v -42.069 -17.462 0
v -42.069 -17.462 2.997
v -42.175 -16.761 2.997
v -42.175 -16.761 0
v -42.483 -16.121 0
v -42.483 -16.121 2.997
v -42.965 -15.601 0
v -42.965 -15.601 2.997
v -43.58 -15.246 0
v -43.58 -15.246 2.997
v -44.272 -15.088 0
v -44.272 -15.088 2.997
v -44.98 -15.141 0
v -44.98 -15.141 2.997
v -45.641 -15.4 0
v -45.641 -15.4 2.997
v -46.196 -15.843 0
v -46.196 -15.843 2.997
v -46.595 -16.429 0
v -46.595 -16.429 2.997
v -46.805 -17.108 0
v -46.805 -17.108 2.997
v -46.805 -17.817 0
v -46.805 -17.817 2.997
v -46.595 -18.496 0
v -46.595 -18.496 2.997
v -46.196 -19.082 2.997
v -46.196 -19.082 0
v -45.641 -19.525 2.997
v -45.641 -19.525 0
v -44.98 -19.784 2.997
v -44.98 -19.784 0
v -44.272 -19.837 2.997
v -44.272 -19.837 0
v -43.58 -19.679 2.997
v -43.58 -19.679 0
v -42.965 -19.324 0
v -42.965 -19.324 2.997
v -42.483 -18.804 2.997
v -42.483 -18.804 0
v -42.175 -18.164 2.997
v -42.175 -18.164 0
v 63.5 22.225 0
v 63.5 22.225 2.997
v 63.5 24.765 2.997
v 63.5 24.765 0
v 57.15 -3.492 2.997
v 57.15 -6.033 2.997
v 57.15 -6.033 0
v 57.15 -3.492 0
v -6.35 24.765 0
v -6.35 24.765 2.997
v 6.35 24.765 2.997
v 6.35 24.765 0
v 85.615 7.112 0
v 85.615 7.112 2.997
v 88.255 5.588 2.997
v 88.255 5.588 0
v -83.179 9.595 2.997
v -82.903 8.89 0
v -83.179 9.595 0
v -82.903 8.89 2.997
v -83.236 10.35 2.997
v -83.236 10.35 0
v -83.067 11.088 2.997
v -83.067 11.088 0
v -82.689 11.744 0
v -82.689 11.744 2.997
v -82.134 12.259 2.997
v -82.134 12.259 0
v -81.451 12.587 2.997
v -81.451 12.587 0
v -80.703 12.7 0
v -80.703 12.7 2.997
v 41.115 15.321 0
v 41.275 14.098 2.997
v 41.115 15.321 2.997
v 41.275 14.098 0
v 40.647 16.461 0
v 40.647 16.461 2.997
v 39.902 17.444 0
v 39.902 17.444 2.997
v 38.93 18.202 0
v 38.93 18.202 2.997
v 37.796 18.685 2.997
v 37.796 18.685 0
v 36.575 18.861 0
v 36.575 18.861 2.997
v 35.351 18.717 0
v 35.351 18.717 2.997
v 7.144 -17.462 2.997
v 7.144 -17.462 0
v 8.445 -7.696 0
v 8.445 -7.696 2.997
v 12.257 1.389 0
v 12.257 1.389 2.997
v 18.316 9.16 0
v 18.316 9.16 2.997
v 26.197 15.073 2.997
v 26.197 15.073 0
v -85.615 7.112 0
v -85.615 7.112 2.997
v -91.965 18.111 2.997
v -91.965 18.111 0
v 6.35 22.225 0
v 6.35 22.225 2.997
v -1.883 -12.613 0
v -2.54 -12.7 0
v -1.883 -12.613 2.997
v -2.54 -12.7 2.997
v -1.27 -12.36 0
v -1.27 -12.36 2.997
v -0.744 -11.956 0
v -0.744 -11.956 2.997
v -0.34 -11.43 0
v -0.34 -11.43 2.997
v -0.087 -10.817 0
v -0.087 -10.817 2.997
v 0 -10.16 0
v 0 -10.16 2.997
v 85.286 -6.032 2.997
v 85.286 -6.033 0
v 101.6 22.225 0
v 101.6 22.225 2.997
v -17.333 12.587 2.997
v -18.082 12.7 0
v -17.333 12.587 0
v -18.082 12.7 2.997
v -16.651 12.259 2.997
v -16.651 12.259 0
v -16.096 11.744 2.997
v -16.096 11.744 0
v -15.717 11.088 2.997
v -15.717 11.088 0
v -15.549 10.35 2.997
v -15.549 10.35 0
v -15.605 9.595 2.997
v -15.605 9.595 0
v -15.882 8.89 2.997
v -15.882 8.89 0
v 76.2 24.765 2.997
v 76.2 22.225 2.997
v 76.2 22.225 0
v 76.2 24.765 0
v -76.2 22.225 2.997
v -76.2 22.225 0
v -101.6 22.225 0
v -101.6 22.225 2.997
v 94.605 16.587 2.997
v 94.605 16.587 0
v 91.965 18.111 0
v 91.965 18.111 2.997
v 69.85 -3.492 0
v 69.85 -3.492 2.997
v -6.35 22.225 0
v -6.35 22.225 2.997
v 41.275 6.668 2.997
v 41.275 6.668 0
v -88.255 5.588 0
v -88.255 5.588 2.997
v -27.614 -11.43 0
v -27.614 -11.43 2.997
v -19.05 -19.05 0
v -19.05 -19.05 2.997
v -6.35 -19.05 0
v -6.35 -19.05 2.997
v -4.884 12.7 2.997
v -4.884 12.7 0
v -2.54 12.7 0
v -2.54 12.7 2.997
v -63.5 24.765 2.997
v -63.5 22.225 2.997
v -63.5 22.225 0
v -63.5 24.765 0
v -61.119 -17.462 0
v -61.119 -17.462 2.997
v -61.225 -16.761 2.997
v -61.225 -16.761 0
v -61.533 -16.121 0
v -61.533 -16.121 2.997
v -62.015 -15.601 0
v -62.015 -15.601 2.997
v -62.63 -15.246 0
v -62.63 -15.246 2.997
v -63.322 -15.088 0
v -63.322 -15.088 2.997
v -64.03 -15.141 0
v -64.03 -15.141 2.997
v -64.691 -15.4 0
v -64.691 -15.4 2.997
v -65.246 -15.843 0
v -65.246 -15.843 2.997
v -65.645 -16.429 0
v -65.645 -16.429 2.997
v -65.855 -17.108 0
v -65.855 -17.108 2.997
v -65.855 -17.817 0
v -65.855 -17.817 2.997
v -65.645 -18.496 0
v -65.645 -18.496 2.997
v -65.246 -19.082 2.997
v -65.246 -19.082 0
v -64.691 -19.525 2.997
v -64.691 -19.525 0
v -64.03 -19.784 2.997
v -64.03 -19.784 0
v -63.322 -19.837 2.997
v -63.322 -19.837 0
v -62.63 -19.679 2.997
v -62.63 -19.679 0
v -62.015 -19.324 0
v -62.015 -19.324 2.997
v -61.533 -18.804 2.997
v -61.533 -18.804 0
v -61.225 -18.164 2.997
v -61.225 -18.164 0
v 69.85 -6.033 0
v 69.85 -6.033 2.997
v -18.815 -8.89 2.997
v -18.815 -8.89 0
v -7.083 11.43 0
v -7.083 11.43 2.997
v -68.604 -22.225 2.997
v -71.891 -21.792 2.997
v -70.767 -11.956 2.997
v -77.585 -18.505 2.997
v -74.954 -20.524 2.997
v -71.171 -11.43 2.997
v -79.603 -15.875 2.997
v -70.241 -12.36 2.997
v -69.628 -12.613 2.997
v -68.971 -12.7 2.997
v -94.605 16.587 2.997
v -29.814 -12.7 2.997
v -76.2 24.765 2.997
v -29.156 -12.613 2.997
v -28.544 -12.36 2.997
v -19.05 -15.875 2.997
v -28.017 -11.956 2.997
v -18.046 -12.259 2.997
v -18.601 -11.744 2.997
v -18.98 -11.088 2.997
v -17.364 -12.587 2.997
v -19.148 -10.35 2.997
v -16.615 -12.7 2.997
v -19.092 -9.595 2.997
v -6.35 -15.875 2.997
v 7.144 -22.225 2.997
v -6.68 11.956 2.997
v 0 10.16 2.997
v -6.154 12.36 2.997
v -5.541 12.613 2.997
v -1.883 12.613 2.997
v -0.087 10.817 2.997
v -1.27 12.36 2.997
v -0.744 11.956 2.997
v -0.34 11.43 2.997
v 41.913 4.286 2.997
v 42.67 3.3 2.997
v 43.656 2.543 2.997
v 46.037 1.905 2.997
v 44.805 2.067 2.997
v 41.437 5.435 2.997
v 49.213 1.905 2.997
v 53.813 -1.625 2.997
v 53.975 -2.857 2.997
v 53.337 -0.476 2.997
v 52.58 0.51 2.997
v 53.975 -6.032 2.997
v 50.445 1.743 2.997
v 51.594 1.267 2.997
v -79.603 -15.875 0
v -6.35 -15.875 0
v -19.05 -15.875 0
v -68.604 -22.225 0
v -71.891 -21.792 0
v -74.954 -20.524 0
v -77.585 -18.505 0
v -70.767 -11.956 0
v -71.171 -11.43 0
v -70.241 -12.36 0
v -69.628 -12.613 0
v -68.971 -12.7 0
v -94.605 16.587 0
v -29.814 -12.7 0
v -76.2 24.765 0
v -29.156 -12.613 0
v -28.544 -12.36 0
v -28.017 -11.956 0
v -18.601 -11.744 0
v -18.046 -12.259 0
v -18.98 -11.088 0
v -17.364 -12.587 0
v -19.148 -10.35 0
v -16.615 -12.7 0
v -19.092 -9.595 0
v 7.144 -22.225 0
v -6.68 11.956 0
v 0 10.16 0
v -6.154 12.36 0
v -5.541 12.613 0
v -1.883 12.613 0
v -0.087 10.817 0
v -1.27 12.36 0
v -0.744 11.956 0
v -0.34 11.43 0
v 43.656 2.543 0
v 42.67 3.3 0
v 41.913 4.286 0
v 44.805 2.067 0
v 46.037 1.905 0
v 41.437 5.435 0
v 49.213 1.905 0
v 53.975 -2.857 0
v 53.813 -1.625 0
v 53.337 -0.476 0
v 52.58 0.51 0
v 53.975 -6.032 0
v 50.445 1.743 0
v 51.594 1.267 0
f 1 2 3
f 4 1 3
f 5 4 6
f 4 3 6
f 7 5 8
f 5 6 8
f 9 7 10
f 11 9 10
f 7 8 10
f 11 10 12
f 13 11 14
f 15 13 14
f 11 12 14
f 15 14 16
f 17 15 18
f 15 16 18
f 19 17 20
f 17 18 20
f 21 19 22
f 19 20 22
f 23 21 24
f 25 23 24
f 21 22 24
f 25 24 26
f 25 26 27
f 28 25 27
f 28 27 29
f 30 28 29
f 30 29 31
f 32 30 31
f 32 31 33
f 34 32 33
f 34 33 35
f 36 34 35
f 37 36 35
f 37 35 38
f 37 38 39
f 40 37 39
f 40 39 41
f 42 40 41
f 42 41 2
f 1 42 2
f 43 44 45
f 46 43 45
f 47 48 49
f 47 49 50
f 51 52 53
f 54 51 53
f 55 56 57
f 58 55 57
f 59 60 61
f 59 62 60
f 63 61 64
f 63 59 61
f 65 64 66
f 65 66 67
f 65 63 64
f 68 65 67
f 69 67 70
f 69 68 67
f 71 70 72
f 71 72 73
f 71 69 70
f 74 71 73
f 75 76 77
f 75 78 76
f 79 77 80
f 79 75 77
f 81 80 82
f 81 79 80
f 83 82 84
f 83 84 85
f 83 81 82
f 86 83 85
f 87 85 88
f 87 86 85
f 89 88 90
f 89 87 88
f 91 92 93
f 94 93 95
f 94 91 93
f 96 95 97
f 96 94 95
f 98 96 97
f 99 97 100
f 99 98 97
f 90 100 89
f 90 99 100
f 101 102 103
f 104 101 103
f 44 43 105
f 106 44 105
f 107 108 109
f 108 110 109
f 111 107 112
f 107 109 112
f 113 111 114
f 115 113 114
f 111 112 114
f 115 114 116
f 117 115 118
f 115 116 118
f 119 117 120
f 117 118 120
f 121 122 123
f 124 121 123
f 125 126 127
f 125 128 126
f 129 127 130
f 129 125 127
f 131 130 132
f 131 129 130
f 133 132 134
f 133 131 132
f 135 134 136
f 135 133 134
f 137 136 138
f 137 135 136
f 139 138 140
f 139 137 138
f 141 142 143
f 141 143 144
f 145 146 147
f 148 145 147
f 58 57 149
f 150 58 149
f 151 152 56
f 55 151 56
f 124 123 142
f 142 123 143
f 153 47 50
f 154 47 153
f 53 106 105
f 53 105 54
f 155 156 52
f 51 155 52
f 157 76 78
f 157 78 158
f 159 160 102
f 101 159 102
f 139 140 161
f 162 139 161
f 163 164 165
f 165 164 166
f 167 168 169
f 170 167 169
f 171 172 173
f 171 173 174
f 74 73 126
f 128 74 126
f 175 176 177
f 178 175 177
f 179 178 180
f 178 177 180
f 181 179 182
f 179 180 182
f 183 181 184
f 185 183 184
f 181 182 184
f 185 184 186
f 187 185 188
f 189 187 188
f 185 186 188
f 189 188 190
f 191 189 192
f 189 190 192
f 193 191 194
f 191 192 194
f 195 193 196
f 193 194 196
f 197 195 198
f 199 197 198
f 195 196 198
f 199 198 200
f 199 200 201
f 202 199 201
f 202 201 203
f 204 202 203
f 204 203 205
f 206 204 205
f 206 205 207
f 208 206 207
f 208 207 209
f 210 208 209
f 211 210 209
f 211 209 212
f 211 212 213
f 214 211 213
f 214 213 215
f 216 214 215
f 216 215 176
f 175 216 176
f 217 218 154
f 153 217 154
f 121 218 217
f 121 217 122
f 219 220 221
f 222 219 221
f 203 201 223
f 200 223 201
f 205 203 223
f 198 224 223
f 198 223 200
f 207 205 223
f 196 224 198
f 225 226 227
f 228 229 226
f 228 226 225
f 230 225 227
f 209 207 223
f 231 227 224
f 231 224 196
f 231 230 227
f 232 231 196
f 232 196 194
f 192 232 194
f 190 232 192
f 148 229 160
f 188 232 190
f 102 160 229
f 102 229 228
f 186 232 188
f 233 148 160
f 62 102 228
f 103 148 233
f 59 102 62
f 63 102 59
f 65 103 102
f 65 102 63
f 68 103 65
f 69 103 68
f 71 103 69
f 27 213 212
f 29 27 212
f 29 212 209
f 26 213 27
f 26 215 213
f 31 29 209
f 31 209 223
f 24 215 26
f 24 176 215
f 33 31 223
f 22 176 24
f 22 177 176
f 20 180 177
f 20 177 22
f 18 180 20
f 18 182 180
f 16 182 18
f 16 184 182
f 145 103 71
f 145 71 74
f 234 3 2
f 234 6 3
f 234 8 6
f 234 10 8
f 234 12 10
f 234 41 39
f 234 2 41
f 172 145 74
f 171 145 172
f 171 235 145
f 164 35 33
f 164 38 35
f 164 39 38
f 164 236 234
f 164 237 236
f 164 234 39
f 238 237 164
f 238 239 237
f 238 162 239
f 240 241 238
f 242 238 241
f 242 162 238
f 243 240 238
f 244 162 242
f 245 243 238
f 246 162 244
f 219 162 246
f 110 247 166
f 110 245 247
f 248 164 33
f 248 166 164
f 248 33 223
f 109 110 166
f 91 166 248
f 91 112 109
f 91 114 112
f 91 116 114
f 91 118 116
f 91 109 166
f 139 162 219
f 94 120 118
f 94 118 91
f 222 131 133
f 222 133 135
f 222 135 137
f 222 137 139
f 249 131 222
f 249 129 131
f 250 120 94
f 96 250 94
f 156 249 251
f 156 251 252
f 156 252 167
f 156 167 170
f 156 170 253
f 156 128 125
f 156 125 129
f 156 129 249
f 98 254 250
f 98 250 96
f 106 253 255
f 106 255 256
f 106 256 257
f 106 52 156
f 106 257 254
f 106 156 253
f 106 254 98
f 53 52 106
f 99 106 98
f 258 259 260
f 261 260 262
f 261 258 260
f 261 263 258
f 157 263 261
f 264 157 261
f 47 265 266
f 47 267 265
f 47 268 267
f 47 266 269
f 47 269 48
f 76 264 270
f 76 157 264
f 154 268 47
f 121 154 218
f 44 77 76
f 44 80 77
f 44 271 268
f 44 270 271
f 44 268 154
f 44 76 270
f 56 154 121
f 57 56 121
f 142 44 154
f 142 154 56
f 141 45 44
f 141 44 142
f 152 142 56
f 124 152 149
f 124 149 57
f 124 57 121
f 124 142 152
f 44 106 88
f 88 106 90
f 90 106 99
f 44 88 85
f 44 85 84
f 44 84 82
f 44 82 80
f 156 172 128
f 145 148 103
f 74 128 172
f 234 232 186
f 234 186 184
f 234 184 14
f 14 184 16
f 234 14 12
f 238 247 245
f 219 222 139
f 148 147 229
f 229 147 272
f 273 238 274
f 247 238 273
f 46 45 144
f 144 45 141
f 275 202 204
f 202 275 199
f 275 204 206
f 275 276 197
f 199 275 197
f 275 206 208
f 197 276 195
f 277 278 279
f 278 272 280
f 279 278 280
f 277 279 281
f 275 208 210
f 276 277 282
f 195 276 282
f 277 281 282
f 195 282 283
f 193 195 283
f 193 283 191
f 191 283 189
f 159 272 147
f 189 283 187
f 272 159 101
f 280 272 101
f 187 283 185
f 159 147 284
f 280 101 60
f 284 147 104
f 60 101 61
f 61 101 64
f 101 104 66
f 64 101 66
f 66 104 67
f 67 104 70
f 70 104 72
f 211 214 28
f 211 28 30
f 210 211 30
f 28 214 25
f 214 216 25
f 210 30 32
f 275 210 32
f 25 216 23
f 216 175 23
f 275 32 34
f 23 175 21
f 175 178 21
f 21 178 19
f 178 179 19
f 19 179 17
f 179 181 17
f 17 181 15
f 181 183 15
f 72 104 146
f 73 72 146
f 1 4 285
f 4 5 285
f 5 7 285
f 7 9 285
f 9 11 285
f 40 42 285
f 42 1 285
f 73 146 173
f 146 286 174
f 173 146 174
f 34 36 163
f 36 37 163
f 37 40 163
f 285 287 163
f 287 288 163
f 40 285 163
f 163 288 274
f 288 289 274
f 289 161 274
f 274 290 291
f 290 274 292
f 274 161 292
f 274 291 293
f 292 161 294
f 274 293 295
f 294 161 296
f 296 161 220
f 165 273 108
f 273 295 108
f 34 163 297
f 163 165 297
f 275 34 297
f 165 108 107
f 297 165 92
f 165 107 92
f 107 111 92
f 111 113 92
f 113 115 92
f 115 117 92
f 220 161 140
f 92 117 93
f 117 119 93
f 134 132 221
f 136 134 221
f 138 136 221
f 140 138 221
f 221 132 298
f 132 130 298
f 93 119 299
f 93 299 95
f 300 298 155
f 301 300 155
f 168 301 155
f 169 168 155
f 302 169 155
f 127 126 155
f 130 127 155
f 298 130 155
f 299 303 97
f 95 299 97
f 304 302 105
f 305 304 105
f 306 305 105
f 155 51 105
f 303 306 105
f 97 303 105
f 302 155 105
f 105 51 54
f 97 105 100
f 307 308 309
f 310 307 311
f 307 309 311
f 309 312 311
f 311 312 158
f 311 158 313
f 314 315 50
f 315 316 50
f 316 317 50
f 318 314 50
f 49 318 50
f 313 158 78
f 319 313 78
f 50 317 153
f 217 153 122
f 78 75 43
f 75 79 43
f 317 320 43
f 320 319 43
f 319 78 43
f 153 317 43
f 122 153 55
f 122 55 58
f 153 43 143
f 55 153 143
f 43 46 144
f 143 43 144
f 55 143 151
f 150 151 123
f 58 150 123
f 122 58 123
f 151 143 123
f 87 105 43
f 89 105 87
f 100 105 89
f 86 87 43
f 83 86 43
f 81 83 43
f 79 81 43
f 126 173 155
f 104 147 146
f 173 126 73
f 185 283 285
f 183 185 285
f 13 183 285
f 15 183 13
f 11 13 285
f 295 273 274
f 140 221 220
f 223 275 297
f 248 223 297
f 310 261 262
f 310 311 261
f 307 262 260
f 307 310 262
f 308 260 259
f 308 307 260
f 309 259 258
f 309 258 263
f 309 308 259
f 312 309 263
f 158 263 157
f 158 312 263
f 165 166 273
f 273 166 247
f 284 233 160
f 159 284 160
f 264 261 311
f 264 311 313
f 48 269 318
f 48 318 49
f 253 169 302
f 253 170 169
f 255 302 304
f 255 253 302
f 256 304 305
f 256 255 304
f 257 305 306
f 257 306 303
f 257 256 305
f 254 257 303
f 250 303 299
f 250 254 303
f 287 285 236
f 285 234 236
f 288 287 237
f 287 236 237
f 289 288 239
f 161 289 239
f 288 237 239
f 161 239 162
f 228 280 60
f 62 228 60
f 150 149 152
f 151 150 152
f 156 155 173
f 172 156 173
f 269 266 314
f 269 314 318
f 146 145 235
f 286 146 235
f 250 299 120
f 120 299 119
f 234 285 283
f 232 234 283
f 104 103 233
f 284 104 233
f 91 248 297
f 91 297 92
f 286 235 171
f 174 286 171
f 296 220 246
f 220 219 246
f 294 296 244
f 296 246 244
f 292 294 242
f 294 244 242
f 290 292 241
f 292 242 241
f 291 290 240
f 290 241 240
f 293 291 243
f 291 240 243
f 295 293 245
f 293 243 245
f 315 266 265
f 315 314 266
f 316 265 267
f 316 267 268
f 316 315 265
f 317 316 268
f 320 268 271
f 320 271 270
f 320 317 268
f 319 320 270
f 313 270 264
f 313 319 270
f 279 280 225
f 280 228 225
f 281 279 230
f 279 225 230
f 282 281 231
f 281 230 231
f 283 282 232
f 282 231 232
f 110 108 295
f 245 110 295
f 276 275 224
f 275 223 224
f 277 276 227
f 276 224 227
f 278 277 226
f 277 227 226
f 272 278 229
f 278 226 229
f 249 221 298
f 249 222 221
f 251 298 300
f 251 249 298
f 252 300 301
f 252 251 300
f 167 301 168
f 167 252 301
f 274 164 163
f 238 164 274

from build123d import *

# Parameters (mm, degrees)
EXTRUDE1_DEPTH        = 2.9972
SKETCH2_W             = 12.7
SKETCH2_H             = 2.54
TABS_DEPTH            = 2.9972
SKETCH3_W             = 12.7
SKETCH3_H             = 3.175
SKETCH3_H_2           = 2.54
SLOTS_DEPTH           = 3.9972
SKETCH4_R             = 2.38125
HOLES_DEPTH           = 3.9972
WHEEL_CLEARANCE_DEPTH = 3.9972
FILLET1_R             = 2.54
FILLET2_R             = 4.7625
FILLET3_R             = 12.7


with BuildPart() as part:
    # Sketch1 → Extrude1 (new body)
    with BuildSketch(Plane.XY):
        Polygon((101.6, 22.225), (-101.6, 22.225), (-75.936780535, -22.225), (75.936780535, -22.225), align=None)
        Polygon((-85.102216058, 12.7), (-13.682348419, 12.7), (-28.347045256, -12.7), (-70.43751922, -12.7), align=None, mode=Mode.SUBTRACT)
        Polygon((-6.35, 12.7), (0, 12.7), (0, -12.7), (-21.014696837, -12.7), align=None, mode=Mode.SUBTRACT)
    extrude(amount=EXTRUDE1_DEPTH)

    # Sketch2 → Tabs (add, through all)
    with BuildSketch(Plane.XY.offset(2.9972)):
        with Locations((-69.85, 23.495)):
            Rectangle(SKETCH2_W, SKETCH2_H)
        with Locations((69.85, 23.495)):
            Rectangle(SKETCH2_W, SKETCH2_H)
        with Locations((0, 23.495)):
            Rectangle(SKETCH2_W, SKETCH2_H)
    extrude(amount=-TABS_DEPTH)

    # Sketch3 → Slots (cut, through all)
    with BuildSketch(Plane.XY.offset(2.9972)):
        Polygon((-94.605125878, 16.586522628), (-88.255125878, 5.588), (-85.615480447, 7.112), (-91.965480447, 18.110522628), align=None)
        with Locations((-12.7, -17.4625)):
            Rectangle(SKETCH3_W, SKETCH3_H)
        Polygon((91.965480447, 18.110522628), (85.615480447, 7.112), (88.255125878, 5.588), (94.605125878, 16.586522628), align=None)
        with Locations((63.5, -4.7625)):
            Rectangle(SKETCH3_W, SKETCH3_H_2)
    extrude(amount=-SLOTS_DEPTH, mode=Mode.SUBTRACT)

    # Sketch4 → Holes (cut, through all)
    with BuildSketch(Plane.XY.offset(2.9972)):
        with Locations((-63.5, -17.4625)):
            Circle(SKETCH4_R)
        with Locations((-44.45, -17.4625)):
            Circle(SKETCH4_R)
    extrude(amount=-HOLES_DEPTH, mode=Mode.SUBTRACT)

    # Sketch5 → Wheel Clearance (cut, through all)
    with BuildSketch(Plane.XY.offset(2.9972)):
        with BuildLine():
            Line((41.275, 19.70839808), (41.275, 1.905))
            Line((41.275, 1.905), (53.975, 1.905))
            Line((53.975, 1.905), (53.975, -6.0325))
            Line((53.975, -6.0325), (85.285524768, -6.0325))
            Line((85.285524768, -6.0325), (85.285524768, -22.225))
            Line((85.285524768, -22.225), (29.36875, -22.225))
            Line((29.36875, -22.225), (7.14375, -22.225))
            Line((7.14375, -22.225), (7.14375, -17.4625))
            ThreePointArc((7.14375, -17.4625), (16.970883995, 7.769512854), (41.275, 19.70839808))
        make_face()
    extrude(amount=-WHEEL_CLEARANCE_DEPTH, mode=Mode.SUBTRACT)

    # Fillet1
    fillet1_edges = [part.edges().sort_by_distance(p)[0] for p in [
        (-21.014696837, -12.7, 1.4986),
        (0, -12.7, 1.4986),
        (0, 12.7, 1.4986),
        (-6.35, 12.7, 1.4986),
        (-28.347045256, -12.7, 1.4986),
        (-13.682348419, 12.7, 1.4986),
        (-85.102216058, 12.7, 1.4986),
        (-70.43751922, -12.7, 1.4986),
    ]]
    fillet(fillet1_edges, radius=FILLET1_R)

    # Fillet2
    fillet2_edges = [part.edges().sort_by_distance(p)[0] for p in [
        (41.275, 19.70839808, 1.4986),
        (41.275, 1.905, 1.4986),
        (53.975, 1.905, 1.4986),
    ]]
    fillet(fillet2_edges, radius=FILLET2_R)

    # Fillet3
    fillet3_edges = [part.edges().sort_by_distance(p)[0] for p in [
        (-75.936780535, -22.225, 1.4986),
    ]]
    fillet(fillet3_edges, radius=FILLET3_R)


solid = part.part
